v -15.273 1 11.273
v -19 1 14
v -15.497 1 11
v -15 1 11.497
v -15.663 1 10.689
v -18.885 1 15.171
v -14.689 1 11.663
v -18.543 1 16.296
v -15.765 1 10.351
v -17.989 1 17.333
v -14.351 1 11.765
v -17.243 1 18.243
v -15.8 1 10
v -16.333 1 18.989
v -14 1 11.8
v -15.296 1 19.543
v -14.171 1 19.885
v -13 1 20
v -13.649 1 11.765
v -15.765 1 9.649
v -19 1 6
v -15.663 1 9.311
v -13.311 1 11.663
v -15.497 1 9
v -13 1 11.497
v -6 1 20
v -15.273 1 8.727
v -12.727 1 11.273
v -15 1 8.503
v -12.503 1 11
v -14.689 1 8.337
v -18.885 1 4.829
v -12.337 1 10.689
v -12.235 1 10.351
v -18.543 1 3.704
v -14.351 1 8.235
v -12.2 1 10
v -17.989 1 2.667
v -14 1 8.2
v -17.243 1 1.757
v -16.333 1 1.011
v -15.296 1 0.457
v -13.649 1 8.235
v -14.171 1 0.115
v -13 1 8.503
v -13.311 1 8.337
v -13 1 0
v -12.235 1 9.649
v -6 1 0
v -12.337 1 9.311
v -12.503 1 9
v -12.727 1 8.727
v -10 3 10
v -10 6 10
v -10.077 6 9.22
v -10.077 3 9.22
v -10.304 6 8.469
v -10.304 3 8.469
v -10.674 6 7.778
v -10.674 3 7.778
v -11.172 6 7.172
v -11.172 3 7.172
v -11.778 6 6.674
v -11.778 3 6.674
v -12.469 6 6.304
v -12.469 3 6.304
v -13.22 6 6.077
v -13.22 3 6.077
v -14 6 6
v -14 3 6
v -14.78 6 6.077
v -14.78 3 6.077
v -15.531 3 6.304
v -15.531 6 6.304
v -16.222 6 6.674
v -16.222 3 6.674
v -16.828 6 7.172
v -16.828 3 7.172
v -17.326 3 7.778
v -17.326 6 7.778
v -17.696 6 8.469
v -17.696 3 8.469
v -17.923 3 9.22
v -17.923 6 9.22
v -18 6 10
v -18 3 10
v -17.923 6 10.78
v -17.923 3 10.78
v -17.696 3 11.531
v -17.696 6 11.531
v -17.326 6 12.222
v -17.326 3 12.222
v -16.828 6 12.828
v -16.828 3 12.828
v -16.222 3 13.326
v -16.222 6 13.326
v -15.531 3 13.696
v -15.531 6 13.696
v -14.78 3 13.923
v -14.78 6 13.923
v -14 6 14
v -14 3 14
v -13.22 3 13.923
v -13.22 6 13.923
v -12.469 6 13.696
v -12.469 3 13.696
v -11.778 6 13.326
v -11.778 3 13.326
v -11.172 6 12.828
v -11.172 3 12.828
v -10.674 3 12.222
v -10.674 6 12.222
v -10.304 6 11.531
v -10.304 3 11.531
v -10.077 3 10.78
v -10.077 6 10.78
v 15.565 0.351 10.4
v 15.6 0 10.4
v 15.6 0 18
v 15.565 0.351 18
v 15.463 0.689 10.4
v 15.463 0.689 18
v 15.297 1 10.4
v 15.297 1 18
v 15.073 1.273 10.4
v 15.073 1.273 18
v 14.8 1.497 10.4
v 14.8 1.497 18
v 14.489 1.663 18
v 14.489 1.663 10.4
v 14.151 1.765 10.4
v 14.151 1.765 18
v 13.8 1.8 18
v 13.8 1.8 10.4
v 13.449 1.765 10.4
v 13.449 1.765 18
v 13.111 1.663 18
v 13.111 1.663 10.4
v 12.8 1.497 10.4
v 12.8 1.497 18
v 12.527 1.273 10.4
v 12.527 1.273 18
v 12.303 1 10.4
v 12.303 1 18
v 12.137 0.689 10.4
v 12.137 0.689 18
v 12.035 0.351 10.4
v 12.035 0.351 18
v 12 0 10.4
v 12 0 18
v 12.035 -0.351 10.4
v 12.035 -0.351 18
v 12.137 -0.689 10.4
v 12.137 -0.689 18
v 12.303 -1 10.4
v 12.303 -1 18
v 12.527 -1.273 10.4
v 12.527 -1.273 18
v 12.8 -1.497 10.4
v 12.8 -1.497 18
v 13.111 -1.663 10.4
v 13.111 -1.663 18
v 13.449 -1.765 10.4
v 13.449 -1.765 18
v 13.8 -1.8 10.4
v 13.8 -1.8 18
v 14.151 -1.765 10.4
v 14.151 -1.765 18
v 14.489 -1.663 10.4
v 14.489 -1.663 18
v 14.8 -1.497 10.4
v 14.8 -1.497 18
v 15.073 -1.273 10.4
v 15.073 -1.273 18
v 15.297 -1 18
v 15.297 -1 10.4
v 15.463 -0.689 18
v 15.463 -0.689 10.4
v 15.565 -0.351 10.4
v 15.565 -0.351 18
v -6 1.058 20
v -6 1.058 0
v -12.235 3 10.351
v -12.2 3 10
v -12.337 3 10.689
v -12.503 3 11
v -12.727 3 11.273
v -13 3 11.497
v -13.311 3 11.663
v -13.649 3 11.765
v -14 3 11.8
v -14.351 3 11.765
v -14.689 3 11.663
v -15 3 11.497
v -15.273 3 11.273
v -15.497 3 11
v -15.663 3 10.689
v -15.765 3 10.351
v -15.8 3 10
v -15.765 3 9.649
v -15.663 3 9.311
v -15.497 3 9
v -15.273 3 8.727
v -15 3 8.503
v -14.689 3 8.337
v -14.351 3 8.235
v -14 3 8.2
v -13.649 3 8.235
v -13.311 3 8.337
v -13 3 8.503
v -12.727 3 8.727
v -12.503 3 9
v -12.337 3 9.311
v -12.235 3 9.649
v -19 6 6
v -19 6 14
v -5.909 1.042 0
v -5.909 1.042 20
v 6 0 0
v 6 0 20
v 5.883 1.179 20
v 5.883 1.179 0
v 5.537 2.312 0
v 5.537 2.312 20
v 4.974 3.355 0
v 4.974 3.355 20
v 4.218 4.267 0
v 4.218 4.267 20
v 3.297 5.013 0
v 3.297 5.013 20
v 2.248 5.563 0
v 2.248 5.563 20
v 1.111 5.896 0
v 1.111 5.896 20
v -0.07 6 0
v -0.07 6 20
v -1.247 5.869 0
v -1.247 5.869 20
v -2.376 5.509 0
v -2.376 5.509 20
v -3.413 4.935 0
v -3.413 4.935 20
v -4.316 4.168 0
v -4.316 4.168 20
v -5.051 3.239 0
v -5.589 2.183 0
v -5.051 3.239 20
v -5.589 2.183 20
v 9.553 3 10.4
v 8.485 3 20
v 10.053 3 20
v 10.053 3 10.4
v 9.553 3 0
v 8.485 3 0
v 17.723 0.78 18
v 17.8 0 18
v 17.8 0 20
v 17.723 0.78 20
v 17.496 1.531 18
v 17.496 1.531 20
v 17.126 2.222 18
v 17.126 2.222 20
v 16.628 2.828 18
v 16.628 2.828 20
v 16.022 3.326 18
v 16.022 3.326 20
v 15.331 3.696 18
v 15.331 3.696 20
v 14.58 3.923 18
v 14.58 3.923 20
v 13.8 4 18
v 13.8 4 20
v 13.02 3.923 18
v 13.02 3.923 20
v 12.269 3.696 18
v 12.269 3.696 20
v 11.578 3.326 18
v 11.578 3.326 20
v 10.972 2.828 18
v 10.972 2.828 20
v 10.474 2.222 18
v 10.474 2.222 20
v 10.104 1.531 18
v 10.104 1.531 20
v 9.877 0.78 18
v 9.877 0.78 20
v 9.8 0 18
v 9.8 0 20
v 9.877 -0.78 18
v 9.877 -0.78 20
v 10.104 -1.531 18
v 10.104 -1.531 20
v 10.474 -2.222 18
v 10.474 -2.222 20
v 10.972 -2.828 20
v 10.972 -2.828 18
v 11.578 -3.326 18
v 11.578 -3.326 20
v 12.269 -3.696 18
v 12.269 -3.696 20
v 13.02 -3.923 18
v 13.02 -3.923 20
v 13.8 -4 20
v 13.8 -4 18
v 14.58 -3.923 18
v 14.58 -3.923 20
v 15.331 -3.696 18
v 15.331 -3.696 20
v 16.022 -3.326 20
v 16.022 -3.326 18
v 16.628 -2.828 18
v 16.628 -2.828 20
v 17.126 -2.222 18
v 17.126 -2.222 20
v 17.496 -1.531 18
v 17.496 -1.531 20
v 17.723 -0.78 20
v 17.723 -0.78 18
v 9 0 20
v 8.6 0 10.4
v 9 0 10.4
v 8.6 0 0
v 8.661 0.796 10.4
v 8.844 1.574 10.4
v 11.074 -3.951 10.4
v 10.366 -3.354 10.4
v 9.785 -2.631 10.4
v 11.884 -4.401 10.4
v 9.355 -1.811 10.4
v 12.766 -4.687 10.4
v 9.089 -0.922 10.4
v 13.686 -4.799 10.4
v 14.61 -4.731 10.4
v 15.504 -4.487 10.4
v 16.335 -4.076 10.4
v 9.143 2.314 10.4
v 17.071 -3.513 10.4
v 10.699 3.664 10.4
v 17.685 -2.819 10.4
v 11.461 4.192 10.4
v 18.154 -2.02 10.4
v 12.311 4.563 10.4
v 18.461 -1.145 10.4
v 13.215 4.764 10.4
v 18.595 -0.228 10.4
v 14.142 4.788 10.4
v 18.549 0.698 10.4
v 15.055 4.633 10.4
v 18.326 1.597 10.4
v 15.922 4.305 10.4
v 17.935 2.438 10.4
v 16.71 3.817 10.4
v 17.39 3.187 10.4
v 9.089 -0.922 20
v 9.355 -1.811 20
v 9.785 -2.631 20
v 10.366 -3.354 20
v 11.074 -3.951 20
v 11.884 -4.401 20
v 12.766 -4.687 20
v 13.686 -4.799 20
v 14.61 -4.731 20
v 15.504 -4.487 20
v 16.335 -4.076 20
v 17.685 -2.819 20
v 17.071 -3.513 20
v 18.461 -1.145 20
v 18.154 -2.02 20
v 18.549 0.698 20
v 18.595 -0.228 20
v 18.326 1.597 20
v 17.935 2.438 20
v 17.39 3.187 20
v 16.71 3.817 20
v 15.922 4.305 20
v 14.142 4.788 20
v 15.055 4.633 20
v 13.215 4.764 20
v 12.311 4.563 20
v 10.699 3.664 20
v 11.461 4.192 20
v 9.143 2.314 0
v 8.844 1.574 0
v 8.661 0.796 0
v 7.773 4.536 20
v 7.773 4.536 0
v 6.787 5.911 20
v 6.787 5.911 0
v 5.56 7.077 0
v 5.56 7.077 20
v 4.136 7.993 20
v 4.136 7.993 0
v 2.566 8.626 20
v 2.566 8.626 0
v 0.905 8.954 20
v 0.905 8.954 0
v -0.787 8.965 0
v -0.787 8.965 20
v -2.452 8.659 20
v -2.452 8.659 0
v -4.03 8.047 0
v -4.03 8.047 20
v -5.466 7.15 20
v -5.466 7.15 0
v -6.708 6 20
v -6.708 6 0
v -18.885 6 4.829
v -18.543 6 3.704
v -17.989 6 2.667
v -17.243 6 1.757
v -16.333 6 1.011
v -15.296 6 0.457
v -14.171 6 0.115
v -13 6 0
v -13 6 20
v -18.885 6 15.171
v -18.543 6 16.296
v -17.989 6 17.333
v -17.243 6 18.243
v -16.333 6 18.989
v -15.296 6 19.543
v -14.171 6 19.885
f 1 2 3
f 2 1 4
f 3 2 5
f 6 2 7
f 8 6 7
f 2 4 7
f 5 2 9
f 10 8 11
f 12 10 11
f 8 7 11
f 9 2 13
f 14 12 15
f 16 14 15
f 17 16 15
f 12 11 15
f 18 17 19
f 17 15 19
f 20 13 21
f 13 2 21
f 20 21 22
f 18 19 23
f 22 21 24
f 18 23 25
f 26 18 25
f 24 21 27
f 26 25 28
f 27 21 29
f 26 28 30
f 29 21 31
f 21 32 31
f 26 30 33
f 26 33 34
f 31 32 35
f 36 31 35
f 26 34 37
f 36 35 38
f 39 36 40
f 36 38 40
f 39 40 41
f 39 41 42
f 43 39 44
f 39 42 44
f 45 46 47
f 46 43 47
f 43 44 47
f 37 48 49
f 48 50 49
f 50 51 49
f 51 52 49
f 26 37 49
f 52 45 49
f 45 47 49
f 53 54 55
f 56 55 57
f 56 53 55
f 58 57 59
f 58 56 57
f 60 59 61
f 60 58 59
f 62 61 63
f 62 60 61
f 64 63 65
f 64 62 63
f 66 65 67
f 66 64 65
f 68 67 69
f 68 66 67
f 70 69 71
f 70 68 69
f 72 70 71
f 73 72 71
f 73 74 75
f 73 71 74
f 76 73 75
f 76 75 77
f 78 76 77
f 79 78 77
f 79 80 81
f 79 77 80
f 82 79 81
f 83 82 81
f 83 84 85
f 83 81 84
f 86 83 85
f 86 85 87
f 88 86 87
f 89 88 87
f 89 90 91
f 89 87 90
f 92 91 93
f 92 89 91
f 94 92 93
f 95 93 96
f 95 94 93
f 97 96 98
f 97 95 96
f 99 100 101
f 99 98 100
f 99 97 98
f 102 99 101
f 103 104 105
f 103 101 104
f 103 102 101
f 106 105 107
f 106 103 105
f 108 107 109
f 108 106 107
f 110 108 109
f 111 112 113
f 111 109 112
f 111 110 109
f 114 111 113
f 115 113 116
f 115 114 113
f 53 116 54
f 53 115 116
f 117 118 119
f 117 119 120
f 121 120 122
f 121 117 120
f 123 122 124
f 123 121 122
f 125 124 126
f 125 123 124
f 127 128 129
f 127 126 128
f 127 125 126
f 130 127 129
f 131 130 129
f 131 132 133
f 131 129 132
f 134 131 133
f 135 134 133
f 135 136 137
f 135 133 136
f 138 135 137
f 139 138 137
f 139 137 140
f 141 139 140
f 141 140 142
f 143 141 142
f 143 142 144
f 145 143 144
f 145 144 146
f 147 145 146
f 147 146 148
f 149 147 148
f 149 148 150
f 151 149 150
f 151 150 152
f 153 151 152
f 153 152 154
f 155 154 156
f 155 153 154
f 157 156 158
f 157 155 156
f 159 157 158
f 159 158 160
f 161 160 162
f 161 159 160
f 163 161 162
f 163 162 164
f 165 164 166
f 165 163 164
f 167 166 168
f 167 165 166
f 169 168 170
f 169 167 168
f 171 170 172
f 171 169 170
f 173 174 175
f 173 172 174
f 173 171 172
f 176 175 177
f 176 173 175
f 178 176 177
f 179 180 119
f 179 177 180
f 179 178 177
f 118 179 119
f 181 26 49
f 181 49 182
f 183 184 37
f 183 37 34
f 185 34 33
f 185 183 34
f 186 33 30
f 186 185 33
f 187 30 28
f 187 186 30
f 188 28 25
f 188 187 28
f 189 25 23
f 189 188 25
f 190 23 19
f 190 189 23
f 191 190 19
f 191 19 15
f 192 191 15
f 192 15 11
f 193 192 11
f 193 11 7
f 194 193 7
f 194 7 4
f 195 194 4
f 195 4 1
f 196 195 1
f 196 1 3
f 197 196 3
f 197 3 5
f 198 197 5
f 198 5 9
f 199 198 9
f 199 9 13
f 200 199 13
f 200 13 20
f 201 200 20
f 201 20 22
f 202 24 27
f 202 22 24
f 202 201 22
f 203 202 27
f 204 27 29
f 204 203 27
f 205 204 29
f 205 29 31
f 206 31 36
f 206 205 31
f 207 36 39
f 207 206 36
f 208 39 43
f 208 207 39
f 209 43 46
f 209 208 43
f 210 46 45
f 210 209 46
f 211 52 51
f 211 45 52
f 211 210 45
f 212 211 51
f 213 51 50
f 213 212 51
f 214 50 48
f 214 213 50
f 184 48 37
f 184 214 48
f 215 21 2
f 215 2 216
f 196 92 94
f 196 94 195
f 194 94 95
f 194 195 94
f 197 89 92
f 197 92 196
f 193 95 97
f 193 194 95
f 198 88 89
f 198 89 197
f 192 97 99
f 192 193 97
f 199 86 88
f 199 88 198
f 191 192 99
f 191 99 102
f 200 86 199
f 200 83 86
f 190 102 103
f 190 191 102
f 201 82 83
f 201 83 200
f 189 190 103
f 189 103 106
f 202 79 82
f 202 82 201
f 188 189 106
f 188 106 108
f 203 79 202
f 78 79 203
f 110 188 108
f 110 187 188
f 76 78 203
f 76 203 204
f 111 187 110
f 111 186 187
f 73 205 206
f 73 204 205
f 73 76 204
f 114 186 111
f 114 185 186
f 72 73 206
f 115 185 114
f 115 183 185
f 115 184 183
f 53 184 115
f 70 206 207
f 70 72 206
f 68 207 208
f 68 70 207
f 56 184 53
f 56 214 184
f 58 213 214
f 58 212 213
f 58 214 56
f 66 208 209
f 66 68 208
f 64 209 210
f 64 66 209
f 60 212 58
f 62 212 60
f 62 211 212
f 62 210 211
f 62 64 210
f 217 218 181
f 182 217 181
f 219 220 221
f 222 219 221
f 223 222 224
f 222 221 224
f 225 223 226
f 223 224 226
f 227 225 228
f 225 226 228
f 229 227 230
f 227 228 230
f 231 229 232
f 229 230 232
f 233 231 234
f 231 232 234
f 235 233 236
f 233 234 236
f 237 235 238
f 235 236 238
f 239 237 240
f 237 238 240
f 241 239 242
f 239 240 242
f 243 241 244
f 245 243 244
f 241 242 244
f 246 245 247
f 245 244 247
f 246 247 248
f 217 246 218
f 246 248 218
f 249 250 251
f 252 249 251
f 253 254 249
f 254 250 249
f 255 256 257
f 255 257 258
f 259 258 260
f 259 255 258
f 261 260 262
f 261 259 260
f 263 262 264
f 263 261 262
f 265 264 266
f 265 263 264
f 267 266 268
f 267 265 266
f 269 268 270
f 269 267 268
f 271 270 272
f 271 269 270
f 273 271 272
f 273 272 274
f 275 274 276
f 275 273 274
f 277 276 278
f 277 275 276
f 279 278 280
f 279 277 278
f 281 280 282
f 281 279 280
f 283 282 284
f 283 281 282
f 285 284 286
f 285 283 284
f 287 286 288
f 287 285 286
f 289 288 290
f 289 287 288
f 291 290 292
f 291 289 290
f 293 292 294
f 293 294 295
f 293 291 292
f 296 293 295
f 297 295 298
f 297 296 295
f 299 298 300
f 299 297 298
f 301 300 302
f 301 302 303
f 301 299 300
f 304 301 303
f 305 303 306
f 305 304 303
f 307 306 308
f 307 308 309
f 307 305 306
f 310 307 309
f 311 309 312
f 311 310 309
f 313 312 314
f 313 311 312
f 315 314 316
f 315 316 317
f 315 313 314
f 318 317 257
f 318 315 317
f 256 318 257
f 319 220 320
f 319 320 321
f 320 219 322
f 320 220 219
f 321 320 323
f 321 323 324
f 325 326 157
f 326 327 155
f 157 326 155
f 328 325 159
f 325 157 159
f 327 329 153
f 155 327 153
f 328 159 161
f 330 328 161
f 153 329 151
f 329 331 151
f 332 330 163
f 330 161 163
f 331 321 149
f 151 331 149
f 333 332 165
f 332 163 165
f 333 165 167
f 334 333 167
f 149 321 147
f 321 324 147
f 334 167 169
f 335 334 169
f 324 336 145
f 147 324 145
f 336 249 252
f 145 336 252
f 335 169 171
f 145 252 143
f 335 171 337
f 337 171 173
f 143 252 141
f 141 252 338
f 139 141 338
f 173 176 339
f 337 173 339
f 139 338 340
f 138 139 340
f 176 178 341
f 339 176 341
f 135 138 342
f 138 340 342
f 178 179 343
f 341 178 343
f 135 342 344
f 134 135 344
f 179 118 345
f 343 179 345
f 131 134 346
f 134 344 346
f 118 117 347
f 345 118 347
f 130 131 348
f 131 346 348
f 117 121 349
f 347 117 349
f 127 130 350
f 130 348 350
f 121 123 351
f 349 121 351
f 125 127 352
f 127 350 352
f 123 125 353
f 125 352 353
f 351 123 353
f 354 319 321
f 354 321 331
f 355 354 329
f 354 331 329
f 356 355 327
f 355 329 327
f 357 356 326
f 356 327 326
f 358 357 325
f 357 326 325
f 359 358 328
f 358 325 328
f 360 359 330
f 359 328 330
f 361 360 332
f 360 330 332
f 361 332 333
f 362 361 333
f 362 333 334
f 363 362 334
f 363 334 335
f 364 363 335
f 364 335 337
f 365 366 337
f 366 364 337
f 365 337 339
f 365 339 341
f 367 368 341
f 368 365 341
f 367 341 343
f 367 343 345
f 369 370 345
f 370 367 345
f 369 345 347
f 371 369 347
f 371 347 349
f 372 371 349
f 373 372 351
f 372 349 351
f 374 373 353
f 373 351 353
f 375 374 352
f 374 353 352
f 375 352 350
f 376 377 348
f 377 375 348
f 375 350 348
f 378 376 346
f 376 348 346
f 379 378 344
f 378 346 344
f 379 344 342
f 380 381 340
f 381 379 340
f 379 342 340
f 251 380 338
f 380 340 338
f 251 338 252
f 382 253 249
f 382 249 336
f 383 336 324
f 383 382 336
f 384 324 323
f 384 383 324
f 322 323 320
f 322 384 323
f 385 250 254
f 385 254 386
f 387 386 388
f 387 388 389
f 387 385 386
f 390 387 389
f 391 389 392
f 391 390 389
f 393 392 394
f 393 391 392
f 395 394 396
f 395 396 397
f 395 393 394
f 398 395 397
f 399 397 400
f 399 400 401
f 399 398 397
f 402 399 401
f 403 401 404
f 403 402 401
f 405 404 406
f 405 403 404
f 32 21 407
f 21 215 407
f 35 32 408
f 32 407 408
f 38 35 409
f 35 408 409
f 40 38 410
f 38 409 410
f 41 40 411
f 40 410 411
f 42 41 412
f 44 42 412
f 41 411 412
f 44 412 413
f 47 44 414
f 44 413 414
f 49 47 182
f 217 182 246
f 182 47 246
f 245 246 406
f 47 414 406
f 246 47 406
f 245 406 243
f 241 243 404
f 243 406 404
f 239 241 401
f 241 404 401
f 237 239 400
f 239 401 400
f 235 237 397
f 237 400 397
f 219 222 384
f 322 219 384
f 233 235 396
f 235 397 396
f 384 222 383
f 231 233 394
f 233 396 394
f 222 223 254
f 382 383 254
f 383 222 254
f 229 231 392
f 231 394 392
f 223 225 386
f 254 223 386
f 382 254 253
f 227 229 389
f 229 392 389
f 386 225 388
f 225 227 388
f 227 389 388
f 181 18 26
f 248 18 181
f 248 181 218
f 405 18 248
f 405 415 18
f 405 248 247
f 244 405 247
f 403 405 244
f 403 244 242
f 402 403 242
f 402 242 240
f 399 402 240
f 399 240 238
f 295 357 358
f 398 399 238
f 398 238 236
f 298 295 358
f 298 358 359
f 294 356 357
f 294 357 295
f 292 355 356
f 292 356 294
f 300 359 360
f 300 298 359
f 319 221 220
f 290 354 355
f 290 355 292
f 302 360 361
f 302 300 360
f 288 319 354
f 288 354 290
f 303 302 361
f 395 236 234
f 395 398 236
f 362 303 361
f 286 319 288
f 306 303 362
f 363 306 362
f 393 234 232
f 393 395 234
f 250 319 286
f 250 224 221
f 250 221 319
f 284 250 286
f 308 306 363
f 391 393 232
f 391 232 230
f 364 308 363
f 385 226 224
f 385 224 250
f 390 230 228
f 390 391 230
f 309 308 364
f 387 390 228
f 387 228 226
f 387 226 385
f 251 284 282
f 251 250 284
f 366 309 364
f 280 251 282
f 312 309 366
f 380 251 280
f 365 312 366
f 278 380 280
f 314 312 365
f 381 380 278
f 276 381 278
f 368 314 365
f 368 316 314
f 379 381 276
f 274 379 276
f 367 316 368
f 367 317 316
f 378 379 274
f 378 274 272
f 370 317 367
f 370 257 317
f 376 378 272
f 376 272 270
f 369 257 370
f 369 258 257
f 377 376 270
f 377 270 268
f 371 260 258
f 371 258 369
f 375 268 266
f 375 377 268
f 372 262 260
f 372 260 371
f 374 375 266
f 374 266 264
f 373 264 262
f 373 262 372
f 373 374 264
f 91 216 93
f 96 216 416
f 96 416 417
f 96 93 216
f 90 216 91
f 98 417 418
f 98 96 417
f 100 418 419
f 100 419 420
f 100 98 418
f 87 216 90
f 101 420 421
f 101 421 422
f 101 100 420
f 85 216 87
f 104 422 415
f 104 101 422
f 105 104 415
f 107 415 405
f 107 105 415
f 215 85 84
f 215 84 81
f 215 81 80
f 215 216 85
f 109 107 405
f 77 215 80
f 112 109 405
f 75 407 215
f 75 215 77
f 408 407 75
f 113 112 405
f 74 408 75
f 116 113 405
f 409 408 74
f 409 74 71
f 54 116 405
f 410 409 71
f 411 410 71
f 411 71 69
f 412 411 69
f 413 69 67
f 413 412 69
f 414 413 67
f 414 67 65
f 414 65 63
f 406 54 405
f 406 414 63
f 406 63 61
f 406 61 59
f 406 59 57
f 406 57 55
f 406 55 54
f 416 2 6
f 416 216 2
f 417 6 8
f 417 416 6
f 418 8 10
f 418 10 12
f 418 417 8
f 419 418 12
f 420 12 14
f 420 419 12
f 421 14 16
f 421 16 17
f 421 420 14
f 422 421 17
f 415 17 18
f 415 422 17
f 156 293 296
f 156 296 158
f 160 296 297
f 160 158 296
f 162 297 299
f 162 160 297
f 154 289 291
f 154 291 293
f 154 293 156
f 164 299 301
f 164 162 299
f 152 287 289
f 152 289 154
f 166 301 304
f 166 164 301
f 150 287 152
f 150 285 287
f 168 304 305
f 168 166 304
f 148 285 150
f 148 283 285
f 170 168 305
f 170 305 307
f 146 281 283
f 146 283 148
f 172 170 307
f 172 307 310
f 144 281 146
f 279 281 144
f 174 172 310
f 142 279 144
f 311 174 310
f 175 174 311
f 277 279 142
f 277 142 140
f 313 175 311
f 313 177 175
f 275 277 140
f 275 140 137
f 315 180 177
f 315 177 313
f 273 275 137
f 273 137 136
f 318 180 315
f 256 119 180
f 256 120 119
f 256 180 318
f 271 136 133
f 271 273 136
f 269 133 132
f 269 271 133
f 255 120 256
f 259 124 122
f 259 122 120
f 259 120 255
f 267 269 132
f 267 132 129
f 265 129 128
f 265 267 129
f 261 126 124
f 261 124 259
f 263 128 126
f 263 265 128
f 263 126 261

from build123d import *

# Parameters (mm, degrees)
CYLINDER095_R     = 4
CYLINDER095_DEPTH = 20
CYLINDER096_R     = 4
CYLINDER096_DEPTH = 2
CYLINDER005_R     = 5.2
CYLINDER005_DEPTH = 10.4
CYLINDER003_R     = 1.8
CYLINDER003_DEPTH = 50
CYLINDER001_W     = 6
CYLINDER001_H     = 20
CYLINDER001_ANGLE = 180
CYLINDER004_R     = 1.8
CYLINDER004_DEPTH = 20
BOX_W             = 13
BOX_H             = 5
BOX_DEPTH         = 20
FILLET_R          = 6
CYLINDER002_R     = 4.8
CYLINDER002_DEPTH = 20
CYLINDER_W        = 9
CYLINDER_H        = 20
CYLINDER_ANGLE    = 170
BOX001_W          = 7.8
BOX001_H          = 3
BOX001_DEPTH      = 20


with BuildPart() as bolt_head_cylinder:
    # Cylinder095 → Cylinder095 (new body)
    with BuildSketch(Plane(origin=(-14, 3, 10), x_dir=(1, 0, 0), z_dir=(0, 1, 0))):
        Circle(CYLINDER095_R)
    extrude(amount=CYLINDER095_DEPTH)


with BuildPart() as bolt_head_side_cylinder:
    # Cylinder096 → Cylinder096 (new body)
    with BuildSketch(Plane(origin=(13.8, 0, 18), x_dir=(1, 0, 0), z_dir=(0, 0, 1))):
        Circle(CYLINDER096_R)
    extrude(amount=CYLINDER096_DEPTH)


with BuildPart() as top_half_remove_fusion:
    # Cylinder005 → Cylinder005 (new body)
    with BuildSketch(Plane(origin=(13.8, 0, 0), x_dir=(1, 0, 0), z_dir=(0, 0, 1))):
        Circle(CYLINDER005_R)
    extrude(amount=CYLINDER005_DEPTH)

    # Fusion002: union bolt head cylinder, bolt head side cylinder
    add(bolt_head_cylinder.part)
    add(bolt_head_side_cylinder.part)


with BuildPart() as bolt_hole:
    # Cylinder003 → Cylinder003 (new body)
    with BuildSketch(Plane(origin=(-14, 20, 10), x_dir=(1, 0, 0), z_dir=(0, -1, 0))):
        Circle(CYLINDER003_R)
    extrude(amount=CYLINDER003_DEPTH)


with BuildPart() as hole_cylinder:
    # Cylinder001 → Cylinder001 (revolve)
    with BuildSketch(Plane.XZ):
        with Locations((3, 10)):
            Rectangle(CYLINDER001_W, CYLINDER001_H)
    revolve(axis=Axis((0, 0, 0), (0, 0, 1)), revolution_arc=CYLINDER001_ANGLE)


with BuildPart() as hole_fusion:
    # Cylinder004 → Cylinder004 (new body)
    with BuildSketch(Plane(origin=(13.8, 0, 0), x_dir=(1, 0, 0), z_dir=(0, 0, 1))):
        Circle(CYLINDER004_R)
    extrude(amount=CYLINDER004_DEPTH)

    # Fusion: union bolt hole, hole cylinder
    add(bolt_hole.part)
    add(hole_cylinder.part)


with BuildPart() as petal_fillet:
    # Box → Box (new body)
    with BuildSketch(Plane(origin=(-19, 1, 0), x_dir=(1, 0, 0), z_dir=(0, 0, 1))):
        with Locations((6.5, 2.5)):
            Rectangle(BOX_W, BOX_H)
    extrude(amount=BOX_DEPTH)

    # Fillet
    fillet_edges = [petal_fillet.edges().sort_by_distance(p)[0] for p in [
        (-19, 3.5, 20),
        (-19, 3.5, 0),
    ]]
    fillet(fillet_edges, radius=FILLET_R)


with BuildPart() as side_cylinder:
    # Cylinder002 → Cylinder002 (new body)
    with BuildSketch(Plane(origin=(13.8, 0, 0), x_dir=(1, 0, 0), z_dir=(0, 0, 1))):
        Circle(CYLINDER002_R)
    extrude(amount=CYLINDER002_DEPTH)


with BuildPart() as external_cylinder:
    # Cylinder → Cylinder (revolve)
    with BuildSketch(Plane.XZ):
        with Locations((4.5, 10)):
            Rectangle(CYLINDER_W, CYLINDER_H)
    revolve(axis=Axis((0, 0, 0), (0, 0, 1)), revolution_arc=CYLINDER_ANGLE)


with BuildPart() as top_half_clone:
    # Box001 → Box001 (new body)
    with BuildSketch(Plane(origin=(6, 0, 0), x_dir=(1, 0, 0), z_dir=(0, 0, 1))):
        with Locations((3.9, 1.5)):
            Rectangle(BOX001_W, BOX001_H)
    extrude(amount=BOX001_DEPTH)

    # Fusion001: union petal fillet, side cylinder, external cylinder
    add(petal_fillet.part)
    add(side_cylinder.part)
    add(external_cylinder.part)

    # Cut: cut hole fusion
    add(hole_fusion.part, mode=Mode.SUBTRACT)

    # Cut001: cut top half remove fusion
    add(top_half_remove_fusion.part, mode=Mode.SUBTRACT)


solid = top_half_clone.part
